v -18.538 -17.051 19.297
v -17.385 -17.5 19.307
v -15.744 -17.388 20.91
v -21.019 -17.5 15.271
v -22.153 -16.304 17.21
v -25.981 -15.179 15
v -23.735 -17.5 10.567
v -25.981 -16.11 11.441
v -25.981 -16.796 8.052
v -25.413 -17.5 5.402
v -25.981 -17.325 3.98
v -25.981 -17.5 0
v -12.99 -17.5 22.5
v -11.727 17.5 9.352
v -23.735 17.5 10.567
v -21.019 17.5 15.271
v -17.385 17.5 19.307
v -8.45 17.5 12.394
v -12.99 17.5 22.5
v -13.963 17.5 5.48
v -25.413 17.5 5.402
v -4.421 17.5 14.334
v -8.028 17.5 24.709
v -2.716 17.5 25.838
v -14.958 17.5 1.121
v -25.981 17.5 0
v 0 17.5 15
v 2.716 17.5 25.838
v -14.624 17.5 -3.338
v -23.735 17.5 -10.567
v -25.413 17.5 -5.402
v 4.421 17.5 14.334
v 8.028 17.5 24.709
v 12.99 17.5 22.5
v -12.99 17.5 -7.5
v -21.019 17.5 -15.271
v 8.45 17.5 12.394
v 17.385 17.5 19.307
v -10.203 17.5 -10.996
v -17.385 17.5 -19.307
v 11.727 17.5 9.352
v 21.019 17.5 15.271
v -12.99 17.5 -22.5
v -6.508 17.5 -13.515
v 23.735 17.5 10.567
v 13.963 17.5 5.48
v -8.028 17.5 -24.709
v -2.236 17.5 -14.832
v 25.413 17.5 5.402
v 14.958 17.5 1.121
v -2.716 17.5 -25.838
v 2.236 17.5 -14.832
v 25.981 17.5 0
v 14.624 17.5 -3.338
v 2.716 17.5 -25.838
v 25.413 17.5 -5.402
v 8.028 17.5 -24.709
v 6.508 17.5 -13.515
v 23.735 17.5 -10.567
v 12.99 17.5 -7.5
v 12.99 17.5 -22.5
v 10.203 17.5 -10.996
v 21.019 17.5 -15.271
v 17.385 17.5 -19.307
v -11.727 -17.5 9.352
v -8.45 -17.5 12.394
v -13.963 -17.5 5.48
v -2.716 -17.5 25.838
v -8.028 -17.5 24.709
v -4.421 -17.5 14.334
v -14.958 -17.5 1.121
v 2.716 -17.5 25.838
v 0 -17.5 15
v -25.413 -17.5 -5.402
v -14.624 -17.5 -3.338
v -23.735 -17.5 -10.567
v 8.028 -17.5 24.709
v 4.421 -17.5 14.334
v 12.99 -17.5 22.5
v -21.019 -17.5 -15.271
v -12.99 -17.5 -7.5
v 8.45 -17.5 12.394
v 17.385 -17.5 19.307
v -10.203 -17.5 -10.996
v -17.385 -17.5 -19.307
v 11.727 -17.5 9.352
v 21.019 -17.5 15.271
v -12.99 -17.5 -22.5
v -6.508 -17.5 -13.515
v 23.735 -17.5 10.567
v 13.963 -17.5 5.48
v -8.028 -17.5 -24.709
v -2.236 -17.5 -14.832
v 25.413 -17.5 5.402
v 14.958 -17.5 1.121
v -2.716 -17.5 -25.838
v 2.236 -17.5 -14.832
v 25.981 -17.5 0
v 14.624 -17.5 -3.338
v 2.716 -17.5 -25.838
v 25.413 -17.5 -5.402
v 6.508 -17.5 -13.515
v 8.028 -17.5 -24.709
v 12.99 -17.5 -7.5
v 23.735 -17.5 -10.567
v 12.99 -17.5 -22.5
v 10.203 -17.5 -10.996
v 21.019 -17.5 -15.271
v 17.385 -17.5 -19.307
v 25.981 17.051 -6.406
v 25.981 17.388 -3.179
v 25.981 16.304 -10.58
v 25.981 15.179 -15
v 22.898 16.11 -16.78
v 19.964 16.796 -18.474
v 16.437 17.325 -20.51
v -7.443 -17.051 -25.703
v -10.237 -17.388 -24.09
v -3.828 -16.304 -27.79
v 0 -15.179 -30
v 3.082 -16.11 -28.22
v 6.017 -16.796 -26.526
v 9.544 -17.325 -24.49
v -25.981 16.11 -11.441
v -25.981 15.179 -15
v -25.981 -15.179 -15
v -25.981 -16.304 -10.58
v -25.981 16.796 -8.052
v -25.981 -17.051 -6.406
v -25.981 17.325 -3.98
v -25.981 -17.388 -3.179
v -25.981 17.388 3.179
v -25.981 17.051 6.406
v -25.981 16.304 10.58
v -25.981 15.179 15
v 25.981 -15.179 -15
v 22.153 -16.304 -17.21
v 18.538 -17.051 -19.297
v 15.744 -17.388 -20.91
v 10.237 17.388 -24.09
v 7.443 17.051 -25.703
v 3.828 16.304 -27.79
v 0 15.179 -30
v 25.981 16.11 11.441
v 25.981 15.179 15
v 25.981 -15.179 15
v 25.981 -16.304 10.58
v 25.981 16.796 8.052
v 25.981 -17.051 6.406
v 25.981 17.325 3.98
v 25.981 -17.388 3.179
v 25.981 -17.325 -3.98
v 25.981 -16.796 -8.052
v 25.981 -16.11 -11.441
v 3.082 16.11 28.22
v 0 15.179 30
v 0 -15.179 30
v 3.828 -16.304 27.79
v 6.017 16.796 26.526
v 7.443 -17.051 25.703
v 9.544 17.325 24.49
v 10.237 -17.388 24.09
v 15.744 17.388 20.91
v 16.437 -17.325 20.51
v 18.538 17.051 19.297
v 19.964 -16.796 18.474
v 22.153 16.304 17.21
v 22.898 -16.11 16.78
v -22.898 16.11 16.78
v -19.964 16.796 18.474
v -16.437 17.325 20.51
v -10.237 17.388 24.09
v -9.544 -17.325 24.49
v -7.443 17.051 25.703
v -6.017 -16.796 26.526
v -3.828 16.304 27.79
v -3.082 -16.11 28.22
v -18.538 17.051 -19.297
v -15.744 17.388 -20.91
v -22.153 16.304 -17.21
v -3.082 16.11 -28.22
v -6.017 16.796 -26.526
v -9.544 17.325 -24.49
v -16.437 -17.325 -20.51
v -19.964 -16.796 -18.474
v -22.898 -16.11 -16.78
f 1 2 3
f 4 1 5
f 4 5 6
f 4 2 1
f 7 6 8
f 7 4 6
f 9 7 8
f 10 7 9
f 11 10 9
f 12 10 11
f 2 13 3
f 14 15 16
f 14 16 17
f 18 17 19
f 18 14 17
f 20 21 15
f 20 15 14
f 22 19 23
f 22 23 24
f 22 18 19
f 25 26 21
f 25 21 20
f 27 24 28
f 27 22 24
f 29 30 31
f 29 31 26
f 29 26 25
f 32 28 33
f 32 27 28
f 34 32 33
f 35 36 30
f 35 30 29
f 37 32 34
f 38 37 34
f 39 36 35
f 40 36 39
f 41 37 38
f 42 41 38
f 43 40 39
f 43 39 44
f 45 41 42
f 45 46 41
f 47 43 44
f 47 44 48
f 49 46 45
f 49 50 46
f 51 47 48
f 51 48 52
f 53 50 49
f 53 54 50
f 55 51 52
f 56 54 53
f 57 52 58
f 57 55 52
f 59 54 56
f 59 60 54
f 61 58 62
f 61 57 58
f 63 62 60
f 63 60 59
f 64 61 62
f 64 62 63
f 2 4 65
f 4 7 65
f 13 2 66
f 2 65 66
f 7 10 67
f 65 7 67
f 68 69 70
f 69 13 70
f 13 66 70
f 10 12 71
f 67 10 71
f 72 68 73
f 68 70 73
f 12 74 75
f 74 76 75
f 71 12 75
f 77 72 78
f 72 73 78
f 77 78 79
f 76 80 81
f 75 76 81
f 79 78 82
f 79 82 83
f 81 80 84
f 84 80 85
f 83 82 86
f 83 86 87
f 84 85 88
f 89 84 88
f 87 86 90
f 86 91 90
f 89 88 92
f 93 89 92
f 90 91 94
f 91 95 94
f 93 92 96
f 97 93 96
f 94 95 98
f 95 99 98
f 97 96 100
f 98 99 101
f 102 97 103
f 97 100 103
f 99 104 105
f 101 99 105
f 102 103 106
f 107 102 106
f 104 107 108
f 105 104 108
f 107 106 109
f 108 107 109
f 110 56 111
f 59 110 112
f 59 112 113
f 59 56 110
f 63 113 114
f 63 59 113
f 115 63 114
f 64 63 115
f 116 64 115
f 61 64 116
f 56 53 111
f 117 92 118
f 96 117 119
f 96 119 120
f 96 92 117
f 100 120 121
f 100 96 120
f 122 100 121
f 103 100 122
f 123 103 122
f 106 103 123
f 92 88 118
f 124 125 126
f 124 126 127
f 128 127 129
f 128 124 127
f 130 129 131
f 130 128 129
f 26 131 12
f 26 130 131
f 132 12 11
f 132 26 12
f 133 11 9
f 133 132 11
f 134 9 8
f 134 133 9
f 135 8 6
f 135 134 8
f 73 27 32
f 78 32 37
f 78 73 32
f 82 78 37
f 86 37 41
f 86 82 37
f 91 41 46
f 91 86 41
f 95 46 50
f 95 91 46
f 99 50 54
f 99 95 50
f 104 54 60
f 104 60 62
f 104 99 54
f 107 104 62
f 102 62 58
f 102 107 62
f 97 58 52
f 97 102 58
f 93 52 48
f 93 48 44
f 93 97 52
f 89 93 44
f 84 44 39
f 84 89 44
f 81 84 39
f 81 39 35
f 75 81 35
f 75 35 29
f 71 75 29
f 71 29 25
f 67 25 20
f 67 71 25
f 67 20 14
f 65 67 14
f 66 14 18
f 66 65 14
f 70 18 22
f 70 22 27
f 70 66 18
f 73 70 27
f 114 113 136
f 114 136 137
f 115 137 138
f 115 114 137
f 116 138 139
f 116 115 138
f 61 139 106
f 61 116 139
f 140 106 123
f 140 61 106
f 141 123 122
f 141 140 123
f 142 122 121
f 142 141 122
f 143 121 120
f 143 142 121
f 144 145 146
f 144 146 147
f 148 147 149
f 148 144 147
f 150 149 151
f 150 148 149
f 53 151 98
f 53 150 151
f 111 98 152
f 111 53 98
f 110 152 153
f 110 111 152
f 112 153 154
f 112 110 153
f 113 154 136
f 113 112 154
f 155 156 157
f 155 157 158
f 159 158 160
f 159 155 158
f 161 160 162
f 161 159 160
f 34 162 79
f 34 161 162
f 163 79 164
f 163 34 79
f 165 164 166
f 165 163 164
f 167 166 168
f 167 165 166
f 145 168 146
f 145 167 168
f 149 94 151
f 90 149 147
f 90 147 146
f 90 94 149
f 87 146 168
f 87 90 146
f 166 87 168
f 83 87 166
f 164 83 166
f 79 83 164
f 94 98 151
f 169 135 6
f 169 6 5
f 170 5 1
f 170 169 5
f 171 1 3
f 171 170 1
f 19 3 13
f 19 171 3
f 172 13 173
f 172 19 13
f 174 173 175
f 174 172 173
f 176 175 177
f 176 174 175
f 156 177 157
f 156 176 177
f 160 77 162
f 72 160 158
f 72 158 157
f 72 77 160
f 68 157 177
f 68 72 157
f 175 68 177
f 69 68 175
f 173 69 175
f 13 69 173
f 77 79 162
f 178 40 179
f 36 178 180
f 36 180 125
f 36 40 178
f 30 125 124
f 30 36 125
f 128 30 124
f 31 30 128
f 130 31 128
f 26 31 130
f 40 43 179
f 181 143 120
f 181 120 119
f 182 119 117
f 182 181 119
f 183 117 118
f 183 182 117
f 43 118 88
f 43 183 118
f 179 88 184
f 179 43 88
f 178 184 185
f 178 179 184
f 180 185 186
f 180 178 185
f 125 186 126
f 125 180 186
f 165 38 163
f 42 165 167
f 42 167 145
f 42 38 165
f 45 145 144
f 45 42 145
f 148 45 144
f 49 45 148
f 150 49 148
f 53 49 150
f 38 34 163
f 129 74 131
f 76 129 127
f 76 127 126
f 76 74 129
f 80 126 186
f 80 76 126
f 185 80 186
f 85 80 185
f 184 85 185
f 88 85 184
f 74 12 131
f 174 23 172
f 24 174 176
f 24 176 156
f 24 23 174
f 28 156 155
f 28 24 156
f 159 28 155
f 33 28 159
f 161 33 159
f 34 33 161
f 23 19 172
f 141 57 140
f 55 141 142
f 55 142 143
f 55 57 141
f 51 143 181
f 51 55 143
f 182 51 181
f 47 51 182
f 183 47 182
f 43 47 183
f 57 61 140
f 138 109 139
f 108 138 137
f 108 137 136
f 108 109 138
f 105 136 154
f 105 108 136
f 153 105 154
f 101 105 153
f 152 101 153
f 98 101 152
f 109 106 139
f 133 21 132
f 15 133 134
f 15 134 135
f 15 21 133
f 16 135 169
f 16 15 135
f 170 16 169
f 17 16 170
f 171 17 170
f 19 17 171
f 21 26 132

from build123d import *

# Parameters (mm, degrees)
SKETCH1_R                    = 15
BOSS_EXTRUDE1_DEPTH          = 17.5
SKETCH2_OUTSIDE_W            = 192.554
SKETCH2_OUTSIDE_H            = 200.592
SKETCH2_OUTSIDE_R            = 25.980762114
CUT_EXTRUDE1_DEPTH           = 17.5
CUT_EXTRUDE1_TAPER           = 60
CUT_EXTRUDE1_OTHER_WAY_DEPTH = 17.5
CUT_EXTRUDE1_OTHER_WAY_DRAFT = -60
MIRROR1_COPY_1_SKETCH_W      = 192.554
MIRROR1_COPY_1_SKETCH_H      = 200.592
MIRROR1_COPY_1_SKETCH_R      = 25.980762114
MIRROR1_COPY_1_DEPTH         = 17.5
MIRROR1_COPY_1_DRAFT         = -60
MIRROR1_COPY_2_SKETCH_W      = 192.554
MIRROR1_COPY_2_SKETCH_H      = 200.592
MIRROR1_COPY_2_SKETCH_R      = 25.980762114
MIRROR1_COPY_2_DEPTH         = 17.5
MIRROR1_COPY_2_DRAFT         = -60


with BuildPart() as part:
    # Sketch1 → Boss-Extrude1 (new, symmetric)
    with BuildSketch(Plane(origin=(0, 0, 0), x_dir=(1, 0, 0), z_dir=(0, 1, 0))):
        Polygon((0, 30), (-25.980762114, 15), (-25.980762114, -15), (0, -30), (25.980762114, -15), (25.980762114, 15), align=None)
        with Locations(Location((0, 0, 0), (0, 0, 270))):
            Circle(SKETCH1_R, mode=Mode.SUBTRACT)
    extrude(amount=BOSS_EXTRUDE1_DEPTH, both=True)

    # Sketch2 outside → Cut-Extrude1 (cut)
    with BuildSketch(Plane(origin=(0, 17.5, 0), x_dir=(1, 0, 0), z_dir=(0, 1, 0))):
        Rectangle(SKETCH2_OUTSIDE_W, SKETCH2_OUTSIDE_H)
        Circle(SKETCH2_OUTSIDE_R, mode=Mode.SUBTRACT)
    cut_extrude1 = extrude(amount=CUT_EXTRUDE1_DEPTH, taper=CUT_EXTRUDE1_TAPER, mode=Mode.SUBTRACT)


with BuildPart() as cut_extrude1_other_way_tool:
    # Sketch2 outside → Cut-Extrude1 other way (with draft: the straight prism first)
    with BuildSketch(Plane(origin=(0, 17.5, 0), x_dir=(1, 0, 0), z_dir=(0, 1, 0))):
        Rectangle(SKETCH2_OUTSIDE_W, SKETCH2_OUTSIDE_H)
        Circle(SKETCH2_OUTSIDE_R, mode=Mode.SUBTRACT)
    extrude(amount=-CUT_EXTRUDE1_OTHER_WAY_DEPTH)
    # Cut-Extrude1 other way: the draft: its side faces are tilted about the plane it starts from
    cut_extrude1_other_way_sides = [cut_extrude1_other_way_tool.faces().sort_by_distance(p)[0] for p in [
        (0, 8.75, 100.296),
        (96.277, 8.75, 0),
        (0, 8.75, -100.296),
        (-96.277, 8.75, 0),
        (-25.980762114, 8.75, 0),
    ]]
    draft(cut_extrude1_other_way_sides, Plane(origin=(0, 17.5, 0), x_dir=(1, 0, 0), z_dir=(0, 1, 0)), CUT_EXTRUDE1_OTHER_WAY_DRAFT)


with BuildPart() as part_1:
    add(part.part)

    # Cut-Extrude1 other way: cut by cut_extrude1_other_way_tool
    add(cut_extrude1_other_way_tool.part, mode=Mode.SUBTRACT)

    # Mirror1: Cut-Extrude1 across plane
    add(cut_extrude1.mirror(Plane.ZX), mode=Mode.SUBTRACT)


with BuildPart() as mirror1_copy_1_tool:
    # Mirror1 copy 1 sketch → Mirror1 copy 1 (with draft: the straight prism first)
    with BuildSketch(Plane.XZ.offset(17.5)):
        Rectangle(MIRROR1_COPY_1_SKETCH_W, MIRROR1_COPY_1_SKETCH_H)
        Circle(MIRROR1_COPY_1_SKETCH_R, mode=Mode.SUBTRACT)
    extrude(amount=-MIRROR1_COPY_1_DEPTH)
    # Mirror1 copy 1: the draft: its side faces are tilted about the plane it starts from
    mirror1_copy_1_sides = [mirror1_copy_1_tool.faces().sort_by_distance(p)[0] for p in [
        (0, -8.75, 100.296),
        (96.277, -8.75, 0),
        (0, -8.75, -100.296),
        (-96.277, -8.75, 0),
        (-25.980762114, -8.75, 0),
    ]]
    draft(mirror1_copy_1_sides, Plane.XZ.offset(17.5), MIRROR1_COPY_1_DRAFT)


with BuildPart() as part_2:
    add(part_1.part)

    # Mirror1 copy 1: cut by mirror1_copy_1_tool
    add(mirror1_copy_1_tool.part, mode=Mode.SUBTRACT)


with BuildPart() as mirror1_copy_2_tool:
    # Mirror1 copy 2 sketch → Mirror1 copy 2 (with draft: the straight prism first)
    with BuildSketch(Plane.XZ.offset(17.5)):
        Rectangle(MIRROR1_COPY_2_SKETCH_W, MIRROR1_COPY_2_SKETCH_H)
        Circle(MIRROR1_COPY_2_SKETCH_R, mode=Mode.SUBTRACT)
    extrude(amount=-MIRROR1_COPY_2_DEPTH)
    # Mirror1 copy 2: the draft: its side faces are tilted about the plane it starts from
    mirror1_copy_2_sides = [mirror1_copy_2_tool.faces().sort_by_distance(p)[0] for p in [
        (0, -8.75, 100.296),
        (96.277, -8.75, 0),
        (0, -8.75, -100.296),
        (-96.277, -8.75, 0),
        (-25.980762114, -8.75, 0),
    ]]
    draft(mirror1_copy_2_sides, Plane.XZ.offset(17.5), MIRROR1_COPY_2_DRAFT)


with BuildPart() as part_3:
    add(part_2.part)

    # Mirror1 copy 2: cut by mirror1_copy_2_tool
    add(mirror1_copy_2_tool.part, mode=Mode.SUBTRACT)


solid = part_3.part
